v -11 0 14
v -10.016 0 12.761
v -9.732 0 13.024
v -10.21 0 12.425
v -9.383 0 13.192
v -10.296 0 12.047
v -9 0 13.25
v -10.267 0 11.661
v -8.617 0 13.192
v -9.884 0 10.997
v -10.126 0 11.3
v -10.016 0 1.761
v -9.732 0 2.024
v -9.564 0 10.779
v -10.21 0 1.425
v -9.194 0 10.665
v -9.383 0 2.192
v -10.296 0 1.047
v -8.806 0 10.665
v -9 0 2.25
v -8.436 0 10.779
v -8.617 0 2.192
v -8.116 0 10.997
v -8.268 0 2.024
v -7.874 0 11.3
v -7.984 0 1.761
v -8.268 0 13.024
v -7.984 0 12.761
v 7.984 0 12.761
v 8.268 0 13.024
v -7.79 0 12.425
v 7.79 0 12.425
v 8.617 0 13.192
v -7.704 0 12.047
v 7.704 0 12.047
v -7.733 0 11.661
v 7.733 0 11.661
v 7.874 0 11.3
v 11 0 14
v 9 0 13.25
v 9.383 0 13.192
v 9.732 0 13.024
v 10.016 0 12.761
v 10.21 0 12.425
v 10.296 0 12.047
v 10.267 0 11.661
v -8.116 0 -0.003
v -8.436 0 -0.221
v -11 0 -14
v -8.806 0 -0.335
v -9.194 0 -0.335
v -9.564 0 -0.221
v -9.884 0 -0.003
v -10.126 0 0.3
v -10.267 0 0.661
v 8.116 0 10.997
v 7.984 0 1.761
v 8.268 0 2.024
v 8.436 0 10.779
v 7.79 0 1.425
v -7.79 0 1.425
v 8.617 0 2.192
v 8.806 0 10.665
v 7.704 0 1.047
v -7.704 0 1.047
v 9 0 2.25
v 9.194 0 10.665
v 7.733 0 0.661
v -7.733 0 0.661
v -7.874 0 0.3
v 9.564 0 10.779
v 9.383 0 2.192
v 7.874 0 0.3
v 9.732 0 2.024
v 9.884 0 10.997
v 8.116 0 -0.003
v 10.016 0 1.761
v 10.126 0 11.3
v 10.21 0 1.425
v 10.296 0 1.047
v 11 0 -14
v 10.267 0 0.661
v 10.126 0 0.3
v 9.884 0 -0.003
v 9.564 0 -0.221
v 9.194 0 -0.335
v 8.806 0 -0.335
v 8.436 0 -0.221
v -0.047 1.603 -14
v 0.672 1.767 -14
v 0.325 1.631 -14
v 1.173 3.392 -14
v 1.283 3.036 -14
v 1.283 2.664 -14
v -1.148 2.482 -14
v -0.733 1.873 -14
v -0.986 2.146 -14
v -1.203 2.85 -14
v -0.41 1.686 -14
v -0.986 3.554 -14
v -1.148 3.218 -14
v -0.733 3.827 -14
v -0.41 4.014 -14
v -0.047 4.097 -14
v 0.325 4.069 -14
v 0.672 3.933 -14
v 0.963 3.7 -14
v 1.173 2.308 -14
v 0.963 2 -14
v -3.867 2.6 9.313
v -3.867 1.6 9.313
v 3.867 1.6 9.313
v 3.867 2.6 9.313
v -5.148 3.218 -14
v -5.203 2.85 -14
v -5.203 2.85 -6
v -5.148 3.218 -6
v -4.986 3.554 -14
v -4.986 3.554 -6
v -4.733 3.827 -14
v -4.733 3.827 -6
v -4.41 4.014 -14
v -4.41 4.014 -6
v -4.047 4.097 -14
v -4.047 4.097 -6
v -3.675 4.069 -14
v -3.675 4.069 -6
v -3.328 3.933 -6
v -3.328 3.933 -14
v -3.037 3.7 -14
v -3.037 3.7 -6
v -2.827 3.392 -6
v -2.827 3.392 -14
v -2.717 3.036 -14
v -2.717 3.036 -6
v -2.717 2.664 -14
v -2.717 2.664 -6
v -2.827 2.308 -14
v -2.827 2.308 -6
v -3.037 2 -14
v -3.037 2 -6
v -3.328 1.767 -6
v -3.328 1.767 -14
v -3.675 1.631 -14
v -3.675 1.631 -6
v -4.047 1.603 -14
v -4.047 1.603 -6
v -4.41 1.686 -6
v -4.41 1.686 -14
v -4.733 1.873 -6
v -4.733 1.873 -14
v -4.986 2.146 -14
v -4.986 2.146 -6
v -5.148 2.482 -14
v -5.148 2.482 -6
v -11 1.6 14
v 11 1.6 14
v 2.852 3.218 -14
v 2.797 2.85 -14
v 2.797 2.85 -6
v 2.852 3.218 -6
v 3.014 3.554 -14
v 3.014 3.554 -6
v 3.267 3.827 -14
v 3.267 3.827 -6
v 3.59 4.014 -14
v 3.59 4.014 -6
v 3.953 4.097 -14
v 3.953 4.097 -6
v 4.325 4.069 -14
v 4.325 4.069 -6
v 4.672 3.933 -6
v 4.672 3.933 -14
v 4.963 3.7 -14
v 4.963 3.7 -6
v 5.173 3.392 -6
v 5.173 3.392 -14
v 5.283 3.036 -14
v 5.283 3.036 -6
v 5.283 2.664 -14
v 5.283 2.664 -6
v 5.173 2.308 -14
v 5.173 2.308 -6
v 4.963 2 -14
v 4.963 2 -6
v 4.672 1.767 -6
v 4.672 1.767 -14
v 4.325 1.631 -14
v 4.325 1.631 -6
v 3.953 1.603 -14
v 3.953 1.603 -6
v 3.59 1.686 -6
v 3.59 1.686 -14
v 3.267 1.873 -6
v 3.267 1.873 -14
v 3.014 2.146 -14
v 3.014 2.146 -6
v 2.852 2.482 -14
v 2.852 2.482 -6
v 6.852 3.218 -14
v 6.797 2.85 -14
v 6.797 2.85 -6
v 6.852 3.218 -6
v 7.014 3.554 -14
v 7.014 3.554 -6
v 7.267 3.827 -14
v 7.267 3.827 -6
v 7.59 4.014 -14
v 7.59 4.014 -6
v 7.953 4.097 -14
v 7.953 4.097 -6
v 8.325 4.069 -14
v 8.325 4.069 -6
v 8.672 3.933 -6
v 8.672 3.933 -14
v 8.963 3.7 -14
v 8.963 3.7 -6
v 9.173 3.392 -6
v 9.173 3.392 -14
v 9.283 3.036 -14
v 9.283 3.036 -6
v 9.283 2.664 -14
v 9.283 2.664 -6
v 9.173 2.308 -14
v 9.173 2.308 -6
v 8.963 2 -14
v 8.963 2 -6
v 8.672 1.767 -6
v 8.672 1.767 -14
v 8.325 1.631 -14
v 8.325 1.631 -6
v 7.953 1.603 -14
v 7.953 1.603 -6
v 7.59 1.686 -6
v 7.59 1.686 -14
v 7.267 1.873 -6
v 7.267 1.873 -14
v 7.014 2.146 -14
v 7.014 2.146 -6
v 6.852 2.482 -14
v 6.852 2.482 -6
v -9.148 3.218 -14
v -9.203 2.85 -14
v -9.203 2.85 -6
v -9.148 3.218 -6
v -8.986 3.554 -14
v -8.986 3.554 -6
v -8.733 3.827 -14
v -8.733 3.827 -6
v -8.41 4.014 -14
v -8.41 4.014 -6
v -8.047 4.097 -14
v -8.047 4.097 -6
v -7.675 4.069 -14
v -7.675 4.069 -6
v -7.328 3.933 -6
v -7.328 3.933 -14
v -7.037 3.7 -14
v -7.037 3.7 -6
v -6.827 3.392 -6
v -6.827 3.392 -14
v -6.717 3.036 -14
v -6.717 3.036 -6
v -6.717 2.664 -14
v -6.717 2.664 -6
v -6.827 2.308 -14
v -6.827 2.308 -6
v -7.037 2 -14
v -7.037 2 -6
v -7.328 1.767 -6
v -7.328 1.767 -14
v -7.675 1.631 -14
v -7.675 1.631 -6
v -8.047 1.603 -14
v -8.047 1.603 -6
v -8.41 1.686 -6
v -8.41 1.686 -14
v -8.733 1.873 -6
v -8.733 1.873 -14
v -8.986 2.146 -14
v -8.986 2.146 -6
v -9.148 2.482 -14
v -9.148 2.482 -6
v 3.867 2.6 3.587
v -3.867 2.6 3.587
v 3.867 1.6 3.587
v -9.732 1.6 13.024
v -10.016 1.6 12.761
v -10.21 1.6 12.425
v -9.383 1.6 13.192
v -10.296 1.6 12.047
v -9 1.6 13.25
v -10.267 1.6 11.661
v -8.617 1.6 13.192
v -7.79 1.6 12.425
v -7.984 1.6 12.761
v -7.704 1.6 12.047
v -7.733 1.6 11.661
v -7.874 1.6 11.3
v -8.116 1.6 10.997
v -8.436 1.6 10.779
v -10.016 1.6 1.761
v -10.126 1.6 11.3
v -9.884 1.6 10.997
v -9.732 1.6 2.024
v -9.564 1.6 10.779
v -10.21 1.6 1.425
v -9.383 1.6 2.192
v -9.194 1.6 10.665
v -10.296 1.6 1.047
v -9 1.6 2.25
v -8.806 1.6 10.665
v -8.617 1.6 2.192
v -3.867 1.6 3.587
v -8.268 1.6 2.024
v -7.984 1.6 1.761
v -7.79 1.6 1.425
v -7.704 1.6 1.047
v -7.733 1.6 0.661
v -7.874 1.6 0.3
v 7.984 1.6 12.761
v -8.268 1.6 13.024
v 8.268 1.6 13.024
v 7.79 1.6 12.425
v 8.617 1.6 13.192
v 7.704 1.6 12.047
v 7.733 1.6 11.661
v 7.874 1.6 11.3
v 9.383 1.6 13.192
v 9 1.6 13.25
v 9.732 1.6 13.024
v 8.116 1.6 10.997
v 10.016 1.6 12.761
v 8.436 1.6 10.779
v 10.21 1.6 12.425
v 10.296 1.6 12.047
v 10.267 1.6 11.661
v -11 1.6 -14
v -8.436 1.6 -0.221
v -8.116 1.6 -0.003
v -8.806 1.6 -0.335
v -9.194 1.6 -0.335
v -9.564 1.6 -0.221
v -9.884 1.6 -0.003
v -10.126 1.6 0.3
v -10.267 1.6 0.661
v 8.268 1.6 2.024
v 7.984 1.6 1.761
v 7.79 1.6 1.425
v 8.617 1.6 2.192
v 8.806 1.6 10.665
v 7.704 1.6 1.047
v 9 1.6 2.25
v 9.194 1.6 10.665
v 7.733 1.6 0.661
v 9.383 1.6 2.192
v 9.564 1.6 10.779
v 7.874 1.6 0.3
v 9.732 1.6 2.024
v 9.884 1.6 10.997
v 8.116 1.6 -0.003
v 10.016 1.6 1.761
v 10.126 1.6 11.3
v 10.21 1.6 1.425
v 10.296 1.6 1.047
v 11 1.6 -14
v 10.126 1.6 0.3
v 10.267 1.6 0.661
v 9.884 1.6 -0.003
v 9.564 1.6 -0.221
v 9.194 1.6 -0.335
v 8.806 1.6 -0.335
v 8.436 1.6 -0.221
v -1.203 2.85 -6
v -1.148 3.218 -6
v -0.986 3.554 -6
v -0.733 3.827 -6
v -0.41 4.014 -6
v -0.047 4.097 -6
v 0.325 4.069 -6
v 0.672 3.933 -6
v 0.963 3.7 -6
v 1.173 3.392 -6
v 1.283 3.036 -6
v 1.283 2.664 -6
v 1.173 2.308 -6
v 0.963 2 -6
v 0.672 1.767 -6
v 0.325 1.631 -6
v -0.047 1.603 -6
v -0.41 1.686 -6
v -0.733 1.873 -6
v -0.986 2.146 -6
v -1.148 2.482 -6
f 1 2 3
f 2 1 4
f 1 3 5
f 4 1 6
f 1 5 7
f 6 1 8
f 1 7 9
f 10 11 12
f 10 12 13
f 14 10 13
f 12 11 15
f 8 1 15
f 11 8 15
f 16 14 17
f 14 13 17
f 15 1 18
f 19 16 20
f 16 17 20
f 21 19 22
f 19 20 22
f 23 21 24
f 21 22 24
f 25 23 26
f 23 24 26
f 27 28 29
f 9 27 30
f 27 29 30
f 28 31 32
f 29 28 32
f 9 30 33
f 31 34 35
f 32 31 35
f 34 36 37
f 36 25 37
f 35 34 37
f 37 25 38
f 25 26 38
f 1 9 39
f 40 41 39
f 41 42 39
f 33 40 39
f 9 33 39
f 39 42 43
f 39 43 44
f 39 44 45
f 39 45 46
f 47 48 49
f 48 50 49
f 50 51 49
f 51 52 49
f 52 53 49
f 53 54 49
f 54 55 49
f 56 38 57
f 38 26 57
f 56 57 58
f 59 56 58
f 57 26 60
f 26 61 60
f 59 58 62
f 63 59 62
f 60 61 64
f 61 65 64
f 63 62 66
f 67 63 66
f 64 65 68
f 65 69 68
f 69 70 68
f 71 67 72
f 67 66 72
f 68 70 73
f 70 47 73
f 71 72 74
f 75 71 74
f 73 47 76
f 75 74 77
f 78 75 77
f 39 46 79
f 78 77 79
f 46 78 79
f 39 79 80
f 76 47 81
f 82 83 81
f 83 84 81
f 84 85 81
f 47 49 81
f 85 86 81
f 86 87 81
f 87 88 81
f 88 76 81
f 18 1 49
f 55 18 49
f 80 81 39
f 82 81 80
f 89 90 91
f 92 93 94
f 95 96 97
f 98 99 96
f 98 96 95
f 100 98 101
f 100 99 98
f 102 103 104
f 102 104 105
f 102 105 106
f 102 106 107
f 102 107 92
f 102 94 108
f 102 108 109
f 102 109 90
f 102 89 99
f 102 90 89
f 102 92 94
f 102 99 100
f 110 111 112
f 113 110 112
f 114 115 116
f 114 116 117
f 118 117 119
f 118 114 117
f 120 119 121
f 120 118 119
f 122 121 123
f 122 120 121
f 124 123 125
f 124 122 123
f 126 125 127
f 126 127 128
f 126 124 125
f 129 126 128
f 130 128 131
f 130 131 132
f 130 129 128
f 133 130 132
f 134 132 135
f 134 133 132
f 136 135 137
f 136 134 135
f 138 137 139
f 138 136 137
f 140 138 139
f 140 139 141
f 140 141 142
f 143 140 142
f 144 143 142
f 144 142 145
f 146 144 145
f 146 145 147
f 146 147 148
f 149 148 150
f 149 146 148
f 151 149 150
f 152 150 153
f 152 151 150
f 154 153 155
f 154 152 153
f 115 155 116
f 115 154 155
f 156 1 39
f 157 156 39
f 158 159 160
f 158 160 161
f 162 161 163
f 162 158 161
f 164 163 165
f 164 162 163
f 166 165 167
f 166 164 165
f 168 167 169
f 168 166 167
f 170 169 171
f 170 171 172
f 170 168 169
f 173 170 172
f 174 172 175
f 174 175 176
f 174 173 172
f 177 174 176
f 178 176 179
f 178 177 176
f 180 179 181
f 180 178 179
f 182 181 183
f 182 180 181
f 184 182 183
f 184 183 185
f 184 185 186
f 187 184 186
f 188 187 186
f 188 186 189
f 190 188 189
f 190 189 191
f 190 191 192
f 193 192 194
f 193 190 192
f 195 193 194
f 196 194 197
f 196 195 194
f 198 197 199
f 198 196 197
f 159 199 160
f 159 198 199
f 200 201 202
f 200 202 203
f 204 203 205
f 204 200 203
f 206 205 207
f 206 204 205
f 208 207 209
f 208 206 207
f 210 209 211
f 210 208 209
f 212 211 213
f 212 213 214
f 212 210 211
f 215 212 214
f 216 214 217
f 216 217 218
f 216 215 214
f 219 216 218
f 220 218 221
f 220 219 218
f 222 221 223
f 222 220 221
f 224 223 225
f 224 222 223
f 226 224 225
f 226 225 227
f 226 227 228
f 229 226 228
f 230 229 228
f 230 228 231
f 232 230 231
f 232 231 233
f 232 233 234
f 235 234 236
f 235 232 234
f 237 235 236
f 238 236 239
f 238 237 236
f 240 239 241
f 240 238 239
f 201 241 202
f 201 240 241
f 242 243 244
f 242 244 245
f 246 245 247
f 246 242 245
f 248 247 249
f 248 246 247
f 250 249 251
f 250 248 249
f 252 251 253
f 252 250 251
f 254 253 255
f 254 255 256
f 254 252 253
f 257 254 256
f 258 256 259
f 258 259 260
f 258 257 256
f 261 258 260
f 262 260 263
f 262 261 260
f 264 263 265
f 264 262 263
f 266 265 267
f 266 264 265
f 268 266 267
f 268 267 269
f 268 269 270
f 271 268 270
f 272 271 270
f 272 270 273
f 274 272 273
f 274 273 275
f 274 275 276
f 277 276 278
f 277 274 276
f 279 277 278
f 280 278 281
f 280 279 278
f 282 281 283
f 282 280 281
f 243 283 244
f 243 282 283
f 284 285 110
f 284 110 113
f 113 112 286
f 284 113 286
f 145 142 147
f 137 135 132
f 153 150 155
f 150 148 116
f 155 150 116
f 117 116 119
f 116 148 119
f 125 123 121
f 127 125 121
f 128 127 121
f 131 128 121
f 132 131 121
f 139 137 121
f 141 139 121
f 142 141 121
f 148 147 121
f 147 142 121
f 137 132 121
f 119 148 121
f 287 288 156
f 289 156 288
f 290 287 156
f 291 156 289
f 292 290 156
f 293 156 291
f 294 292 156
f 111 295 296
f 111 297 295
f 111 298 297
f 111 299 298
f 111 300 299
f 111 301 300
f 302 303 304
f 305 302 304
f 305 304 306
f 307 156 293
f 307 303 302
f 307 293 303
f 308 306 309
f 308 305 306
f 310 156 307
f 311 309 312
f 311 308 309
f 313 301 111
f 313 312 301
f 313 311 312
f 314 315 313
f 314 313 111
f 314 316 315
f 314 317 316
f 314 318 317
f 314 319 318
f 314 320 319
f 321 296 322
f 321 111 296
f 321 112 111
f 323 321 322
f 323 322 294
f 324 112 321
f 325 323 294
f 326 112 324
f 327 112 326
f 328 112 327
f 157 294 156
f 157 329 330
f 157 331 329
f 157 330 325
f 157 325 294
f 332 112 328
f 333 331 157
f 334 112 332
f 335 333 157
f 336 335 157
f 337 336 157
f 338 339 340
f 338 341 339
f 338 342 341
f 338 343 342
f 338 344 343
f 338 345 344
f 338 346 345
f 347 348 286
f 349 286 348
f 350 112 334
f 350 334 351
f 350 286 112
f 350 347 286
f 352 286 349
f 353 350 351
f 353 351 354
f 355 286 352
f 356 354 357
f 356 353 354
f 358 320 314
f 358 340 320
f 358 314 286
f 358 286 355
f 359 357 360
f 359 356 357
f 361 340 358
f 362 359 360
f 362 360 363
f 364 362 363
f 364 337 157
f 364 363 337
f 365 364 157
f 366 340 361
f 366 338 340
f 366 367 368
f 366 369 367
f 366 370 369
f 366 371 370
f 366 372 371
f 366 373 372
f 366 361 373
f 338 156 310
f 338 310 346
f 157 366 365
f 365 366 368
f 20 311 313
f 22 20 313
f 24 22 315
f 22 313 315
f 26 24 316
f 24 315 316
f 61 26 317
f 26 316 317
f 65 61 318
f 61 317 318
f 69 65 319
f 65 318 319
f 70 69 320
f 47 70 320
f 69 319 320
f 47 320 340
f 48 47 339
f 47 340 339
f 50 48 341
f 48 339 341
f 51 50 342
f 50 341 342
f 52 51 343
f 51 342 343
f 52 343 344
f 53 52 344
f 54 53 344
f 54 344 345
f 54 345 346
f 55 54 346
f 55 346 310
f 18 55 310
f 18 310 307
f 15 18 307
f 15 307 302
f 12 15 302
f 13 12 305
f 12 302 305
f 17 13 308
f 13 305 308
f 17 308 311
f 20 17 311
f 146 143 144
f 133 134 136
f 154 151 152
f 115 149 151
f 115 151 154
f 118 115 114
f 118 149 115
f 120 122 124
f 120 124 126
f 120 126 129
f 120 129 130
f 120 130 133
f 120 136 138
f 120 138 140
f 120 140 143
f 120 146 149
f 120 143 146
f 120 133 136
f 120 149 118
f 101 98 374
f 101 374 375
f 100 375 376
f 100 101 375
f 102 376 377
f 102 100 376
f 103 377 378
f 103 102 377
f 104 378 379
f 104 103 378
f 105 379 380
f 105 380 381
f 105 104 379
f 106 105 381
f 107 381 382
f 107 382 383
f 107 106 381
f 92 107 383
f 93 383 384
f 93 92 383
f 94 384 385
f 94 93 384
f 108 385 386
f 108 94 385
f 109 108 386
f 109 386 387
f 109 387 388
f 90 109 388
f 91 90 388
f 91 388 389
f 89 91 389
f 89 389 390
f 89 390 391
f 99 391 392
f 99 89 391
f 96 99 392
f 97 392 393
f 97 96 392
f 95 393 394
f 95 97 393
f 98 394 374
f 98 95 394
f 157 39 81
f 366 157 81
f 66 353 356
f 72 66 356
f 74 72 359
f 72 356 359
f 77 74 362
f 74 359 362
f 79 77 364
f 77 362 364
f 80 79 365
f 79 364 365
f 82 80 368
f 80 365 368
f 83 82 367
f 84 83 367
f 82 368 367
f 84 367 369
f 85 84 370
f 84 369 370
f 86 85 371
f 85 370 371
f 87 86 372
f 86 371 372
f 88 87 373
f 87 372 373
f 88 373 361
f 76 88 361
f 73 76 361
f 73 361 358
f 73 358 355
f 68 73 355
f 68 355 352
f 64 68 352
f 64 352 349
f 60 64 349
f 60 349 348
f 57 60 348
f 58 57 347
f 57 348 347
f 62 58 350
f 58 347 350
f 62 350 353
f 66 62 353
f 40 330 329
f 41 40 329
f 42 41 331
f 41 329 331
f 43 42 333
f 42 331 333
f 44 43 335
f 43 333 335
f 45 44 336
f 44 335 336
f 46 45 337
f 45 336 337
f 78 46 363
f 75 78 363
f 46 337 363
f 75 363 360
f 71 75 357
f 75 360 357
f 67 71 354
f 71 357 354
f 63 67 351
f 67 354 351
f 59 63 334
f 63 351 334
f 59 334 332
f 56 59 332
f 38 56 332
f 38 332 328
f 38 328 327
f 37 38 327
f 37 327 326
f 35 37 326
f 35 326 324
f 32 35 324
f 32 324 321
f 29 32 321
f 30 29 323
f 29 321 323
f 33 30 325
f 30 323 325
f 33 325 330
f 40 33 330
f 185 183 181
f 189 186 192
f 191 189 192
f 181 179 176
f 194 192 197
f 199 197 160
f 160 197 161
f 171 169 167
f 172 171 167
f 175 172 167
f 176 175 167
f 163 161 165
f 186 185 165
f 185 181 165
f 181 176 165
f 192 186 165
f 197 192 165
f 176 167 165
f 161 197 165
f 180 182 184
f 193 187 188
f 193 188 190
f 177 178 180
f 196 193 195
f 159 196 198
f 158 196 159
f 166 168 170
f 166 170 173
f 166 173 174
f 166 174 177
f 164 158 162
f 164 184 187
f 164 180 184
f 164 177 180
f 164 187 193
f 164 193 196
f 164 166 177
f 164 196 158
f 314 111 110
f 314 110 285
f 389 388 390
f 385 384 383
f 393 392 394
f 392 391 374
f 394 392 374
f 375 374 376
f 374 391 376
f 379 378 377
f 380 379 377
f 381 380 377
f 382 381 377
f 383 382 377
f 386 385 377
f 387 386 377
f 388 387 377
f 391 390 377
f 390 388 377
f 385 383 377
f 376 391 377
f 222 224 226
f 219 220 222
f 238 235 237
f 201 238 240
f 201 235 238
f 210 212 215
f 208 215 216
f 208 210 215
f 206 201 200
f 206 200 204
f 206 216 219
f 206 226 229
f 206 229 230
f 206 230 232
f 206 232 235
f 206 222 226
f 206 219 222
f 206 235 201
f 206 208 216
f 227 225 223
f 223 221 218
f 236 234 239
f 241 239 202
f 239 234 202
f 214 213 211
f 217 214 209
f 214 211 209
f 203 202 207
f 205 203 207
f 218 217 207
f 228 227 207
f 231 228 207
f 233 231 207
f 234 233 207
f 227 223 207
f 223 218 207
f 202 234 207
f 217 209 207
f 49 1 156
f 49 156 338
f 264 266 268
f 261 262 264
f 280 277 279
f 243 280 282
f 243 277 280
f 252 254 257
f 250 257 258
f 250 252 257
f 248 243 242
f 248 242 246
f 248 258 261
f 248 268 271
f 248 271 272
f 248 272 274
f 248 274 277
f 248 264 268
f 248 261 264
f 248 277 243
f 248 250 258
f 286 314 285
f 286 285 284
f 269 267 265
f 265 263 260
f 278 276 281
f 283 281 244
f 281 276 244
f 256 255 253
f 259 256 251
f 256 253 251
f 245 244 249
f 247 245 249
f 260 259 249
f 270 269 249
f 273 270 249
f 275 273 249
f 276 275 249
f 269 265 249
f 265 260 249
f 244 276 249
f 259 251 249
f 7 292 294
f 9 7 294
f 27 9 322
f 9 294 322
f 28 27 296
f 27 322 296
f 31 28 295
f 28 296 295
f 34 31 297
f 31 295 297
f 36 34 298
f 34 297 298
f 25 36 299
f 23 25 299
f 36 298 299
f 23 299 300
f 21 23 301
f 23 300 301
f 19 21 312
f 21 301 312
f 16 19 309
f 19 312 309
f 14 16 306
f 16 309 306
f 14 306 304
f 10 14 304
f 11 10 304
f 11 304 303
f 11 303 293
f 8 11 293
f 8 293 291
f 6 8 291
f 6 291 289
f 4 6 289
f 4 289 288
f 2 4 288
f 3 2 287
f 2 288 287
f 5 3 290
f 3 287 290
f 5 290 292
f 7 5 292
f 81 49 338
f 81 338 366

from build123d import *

# Parameters (mm, degrees)
SKETCH1_W             = 22
SKETCH1_H             = 28
BOSS_EXTRUDE1_DEPTH   = 1.6
SKETCH3_R             = 1.3
CUT_EXTRUDE1_DEPTH    = 1.6
SKETCH4_W             = 7.734506334
SKETCH4_H             = 5.725277538
BOSS_EXTRUDE2_DEPTH   = 1
SKETCH6_R             = 1.25
BOSS_EXTRUDE3_DEPTH   = 8
BOSS_EXTRUDE3_2_DEPTH = 8
BOSS_EXTRUDE3_3_DEPTH = 8
BOSS_EXTRUDE3_4_DEPTH = 8
BOSS_EXTRUDE3_5_DEPTH = 8


with BuildPart() as part:
    # Sketch1 → Boss-Extrude1 (new body)
    with BuildSketch(Plane(origin=(0, 0, 0), x_dir=(1, 0, 0), z_dir=(0, 1, 0))):
        Rectangle(SKETCH1_W, SKETCH1_H)
    extrude(amount=BOSS_EXTRUDE1_DEPTH)

    # Sketch3 → Cut-Extrude1 (cut)
    with BuildSketch(Plane(origin=(0, 1.6, 0), x_dir=(1, 0, 0), z_dir=(0, 1, 0))):
        with Locations(Location((9, -11.95, 0), (0, 0, 270))):
            Circle(SKETCH3_R)
        with Locations(Location((9, -0.95, 0), (0, 0, 270))):
            Circle(SKETCH3_R)
        with Locations(Location((-9, -0.95, 0), (0, 0, 270))):
            Circle(SKETCH3_R)
        with Locations(Location((-9, -11.95, 0), (0, 0, 270))):
            Circle(SKETCH3_R)
    extrude(amount=-CUT_EXTRUDE1_DEPTH, mode=Mode.SUBTRACT)

    # Sketch4 → Boss-Extrude2 (add)
    with BuildSketch(Plane(origin=(0, 1.6, 0), x_dir=(1, 0, 0), z_dir=(0, 1, 0))):
        with Locations((0, -6.45)):
            Rectangle(SKETCH4_W, SKETCH4_H)
    extrude(amount=BOSS_EXTRUDE2_DEPTH)


with BuildPart() as body_2:
    # Sketch6 → Boss-Extrude3 (new body)
    with BuildSketch(Plane(origin=(0, 0, -14), x_dir=(-1, 0, 0), z_dir=(0, 0, -1))):
        with Locations((7.953290508, 2.85)):
            Circle(SKETCH6_R)
    extrude(amount=-BOSS_EXTRUDE3_DEPTH)


with BuildPart() as body_3:
    # Sketch6 → Boss-Extrude3 2 (new body)
    with BuildSketch(Plane(origin=(0, 0, -14), x_dir=(-1, 0, 0), z_dir=(0, 0, -1))):
        with Locations((3.953290508, 2.85)):
            Circle(SKETCH6_R)
    extrude(amount=-BOSS_EXTRUDE3_2_DEPTH)


with BuildPart() as body_4:
    # Sketch6 → Boss-Extrude3 3 (new body)
    with BuildSketch(Plane(origin=(0, 0, -14), x_dir=(-1, 0, 0), z_dir=(0, 0, -1))):
        with Locations((-0.046709492, 2.85)):
            Circle(SKETCH6_R)
    extrude(amount=-BOSS_EXTRUDE3_3_DEPTH)


with BuildPart() as body_5:
    # Sketch6 → Boss-Extrude3 4 (new body)
    with BuildSketch(Plane(origin=(0, 0, -14), x_dir=(-1, 0, 0), z_dir=(0, 0, -1))):
        with Locations((-4.046709492, 2.85)):
            Circle(SKETCH6_R)
    extrude(amount=-BOSS_EXTRUDE3_4_DEPTH)


with BuildPart() as body_6:
    # Sketch6 → Boss-Extrude3 5 (new body)
    with BuildSketch(Plane(origin=(0, 0, -14), x_dir=(-1, 0, 0), z_dir=(0, 0, -1))):
        with Locations((-8.046709492, 2.85)):
            Circle(SKETCH6_R)
    extrude(amount=-BOSS_EXTRUDE3_5_DEPTH)


solid = Compound([part.part, body_2.part, body_3.part, body_4.part, body_5.part, body_6.part])
